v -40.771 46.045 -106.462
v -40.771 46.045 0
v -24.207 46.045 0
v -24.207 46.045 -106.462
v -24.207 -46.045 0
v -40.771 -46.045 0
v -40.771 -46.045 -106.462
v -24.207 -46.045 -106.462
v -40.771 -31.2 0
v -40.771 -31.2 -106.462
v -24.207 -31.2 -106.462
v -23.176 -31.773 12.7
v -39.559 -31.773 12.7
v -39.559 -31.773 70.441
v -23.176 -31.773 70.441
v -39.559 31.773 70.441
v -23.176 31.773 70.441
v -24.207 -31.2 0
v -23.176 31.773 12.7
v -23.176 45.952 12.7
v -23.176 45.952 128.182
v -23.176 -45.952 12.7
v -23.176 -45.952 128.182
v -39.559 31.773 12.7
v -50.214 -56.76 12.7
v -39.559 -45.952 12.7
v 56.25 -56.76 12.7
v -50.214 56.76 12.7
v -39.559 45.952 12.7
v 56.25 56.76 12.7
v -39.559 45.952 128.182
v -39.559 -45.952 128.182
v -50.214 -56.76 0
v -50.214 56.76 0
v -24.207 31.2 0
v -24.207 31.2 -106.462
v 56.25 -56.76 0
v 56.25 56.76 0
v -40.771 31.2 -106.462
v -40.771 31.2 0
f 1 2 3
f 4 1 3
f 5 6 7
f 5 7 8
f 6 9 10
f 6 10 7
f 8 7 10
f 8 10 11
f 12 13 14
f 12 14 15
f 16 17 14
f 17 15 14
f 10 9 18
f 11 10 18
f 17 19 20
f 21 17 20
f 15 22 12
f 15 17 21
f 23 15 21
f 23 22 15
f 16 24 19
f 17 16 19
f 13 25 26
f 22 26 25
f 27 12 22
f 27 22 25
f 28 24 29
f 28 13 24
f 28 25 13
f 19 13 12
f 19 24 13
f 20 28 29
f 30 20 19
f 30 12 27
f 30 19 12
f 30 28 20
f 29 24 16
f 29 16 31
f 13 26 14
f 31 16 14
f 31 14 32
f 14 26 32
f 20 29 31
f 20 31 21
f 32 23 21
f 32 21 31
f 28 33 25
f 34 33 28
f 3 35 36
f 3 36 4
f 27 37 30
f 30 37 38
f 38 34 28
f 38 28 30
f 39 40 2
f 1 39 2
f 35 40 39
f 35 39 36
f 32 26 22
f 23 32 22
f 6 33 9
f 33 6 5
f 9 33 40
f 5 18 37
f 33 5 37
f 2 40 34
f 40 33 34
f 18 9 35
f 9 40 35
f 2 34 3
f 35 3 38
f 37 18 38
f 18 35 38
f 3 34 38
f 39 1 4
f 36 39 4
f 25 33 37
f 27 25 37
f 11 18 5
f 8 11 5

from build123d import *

# Parameters (mm, degrees)
F0_W      = 106.4638644457
F0_H      = 103.2169535756
F1_DEPTH  = 12.7
F2_W      = 16.3826718926
F2_H      = 14.1792520881
F3_DEPTH  = 115.4824048281
F4_W      = 16.3826718926
F4_H      = 57.741202414
F5_DEPTH  = 25.4
F7_DEPTH  = 12.7457336903
F8_W      = 16.5637210011
F8_H      = 14.8448646069
F9_DEPTH  = 106.4620614052
F10_R     = 29.9454441035
F11_DEPTH = 25.4


with BuildPart() as f1:
    # F0 (on Top) → F1 (new body)
    with BuildSketch(Plane.XY):
        with Locations((3.0183121562, -5.1516257226)):
            Rectangle(F0_W, F0_H)
    extrude(amount=F1_DEPTH)

    # F2 (on face) → F3 (join)
    with BuildSketch(Plane.XY.offset(12.7)):
        with Locations((-31.3676968217, -38.8624928892)):
            Rectangle(F2_W, F2_H)
    extrude(amount=F3_DEPTH)

    # F4 (on face) → F5 (join)
    with BuildSketch(Plane(origin=(0, -31.7728668451, 0), x_dir=(-1, 0, 0), z_dir=(0, 1, 0))):
        with Locations((31.3676968217, 99.3118036211)):
            Rectangle(F4_W, F4_H)
    extrude(amount=F5_DEPTH)

    # F6: F1 across plane


with BuildPart() as f1_1:
    add(f1.part)
    add(f1.part.mirror(Plane.XZ))

    # F7 (add, through all): a face of the model
    f7_faces = [f1_1.faces().sort_by_distance(p)[0] for p in [
        (-31.3676968217, -6.3728668451, 99.3118036211),
    ]]
    extrude(f7_faces, amount=F7_DEPTH)

    # F8 (on face) → F9 (join)
    with BuildSketch(Plane(origin=(0, 0, 0), x_dir=(1, 0, 0), z_dir=(0, 0, -1))):
        with Locations((-32.4887447059, 38.6229231954)):
            Rectangle(F8_W, F8_H)
    extrude(amount=F9_DEPTH)

    # F13: F1 across plane


with BuildPart() as f11:
    # F10 (on Top) → F11 (new body)
    with BuildSketch(Plane.XY):
        with Locations((108.9618206024, 20.2722847462)):
            Circle(F10_R)
    extrude(amount=F11_DEPTH)


with BuildPart() as f1_2:
    add(f1_1.part)
    add(f1_1.part.mirror(Plane.XZ))


solid = f1_2.part
